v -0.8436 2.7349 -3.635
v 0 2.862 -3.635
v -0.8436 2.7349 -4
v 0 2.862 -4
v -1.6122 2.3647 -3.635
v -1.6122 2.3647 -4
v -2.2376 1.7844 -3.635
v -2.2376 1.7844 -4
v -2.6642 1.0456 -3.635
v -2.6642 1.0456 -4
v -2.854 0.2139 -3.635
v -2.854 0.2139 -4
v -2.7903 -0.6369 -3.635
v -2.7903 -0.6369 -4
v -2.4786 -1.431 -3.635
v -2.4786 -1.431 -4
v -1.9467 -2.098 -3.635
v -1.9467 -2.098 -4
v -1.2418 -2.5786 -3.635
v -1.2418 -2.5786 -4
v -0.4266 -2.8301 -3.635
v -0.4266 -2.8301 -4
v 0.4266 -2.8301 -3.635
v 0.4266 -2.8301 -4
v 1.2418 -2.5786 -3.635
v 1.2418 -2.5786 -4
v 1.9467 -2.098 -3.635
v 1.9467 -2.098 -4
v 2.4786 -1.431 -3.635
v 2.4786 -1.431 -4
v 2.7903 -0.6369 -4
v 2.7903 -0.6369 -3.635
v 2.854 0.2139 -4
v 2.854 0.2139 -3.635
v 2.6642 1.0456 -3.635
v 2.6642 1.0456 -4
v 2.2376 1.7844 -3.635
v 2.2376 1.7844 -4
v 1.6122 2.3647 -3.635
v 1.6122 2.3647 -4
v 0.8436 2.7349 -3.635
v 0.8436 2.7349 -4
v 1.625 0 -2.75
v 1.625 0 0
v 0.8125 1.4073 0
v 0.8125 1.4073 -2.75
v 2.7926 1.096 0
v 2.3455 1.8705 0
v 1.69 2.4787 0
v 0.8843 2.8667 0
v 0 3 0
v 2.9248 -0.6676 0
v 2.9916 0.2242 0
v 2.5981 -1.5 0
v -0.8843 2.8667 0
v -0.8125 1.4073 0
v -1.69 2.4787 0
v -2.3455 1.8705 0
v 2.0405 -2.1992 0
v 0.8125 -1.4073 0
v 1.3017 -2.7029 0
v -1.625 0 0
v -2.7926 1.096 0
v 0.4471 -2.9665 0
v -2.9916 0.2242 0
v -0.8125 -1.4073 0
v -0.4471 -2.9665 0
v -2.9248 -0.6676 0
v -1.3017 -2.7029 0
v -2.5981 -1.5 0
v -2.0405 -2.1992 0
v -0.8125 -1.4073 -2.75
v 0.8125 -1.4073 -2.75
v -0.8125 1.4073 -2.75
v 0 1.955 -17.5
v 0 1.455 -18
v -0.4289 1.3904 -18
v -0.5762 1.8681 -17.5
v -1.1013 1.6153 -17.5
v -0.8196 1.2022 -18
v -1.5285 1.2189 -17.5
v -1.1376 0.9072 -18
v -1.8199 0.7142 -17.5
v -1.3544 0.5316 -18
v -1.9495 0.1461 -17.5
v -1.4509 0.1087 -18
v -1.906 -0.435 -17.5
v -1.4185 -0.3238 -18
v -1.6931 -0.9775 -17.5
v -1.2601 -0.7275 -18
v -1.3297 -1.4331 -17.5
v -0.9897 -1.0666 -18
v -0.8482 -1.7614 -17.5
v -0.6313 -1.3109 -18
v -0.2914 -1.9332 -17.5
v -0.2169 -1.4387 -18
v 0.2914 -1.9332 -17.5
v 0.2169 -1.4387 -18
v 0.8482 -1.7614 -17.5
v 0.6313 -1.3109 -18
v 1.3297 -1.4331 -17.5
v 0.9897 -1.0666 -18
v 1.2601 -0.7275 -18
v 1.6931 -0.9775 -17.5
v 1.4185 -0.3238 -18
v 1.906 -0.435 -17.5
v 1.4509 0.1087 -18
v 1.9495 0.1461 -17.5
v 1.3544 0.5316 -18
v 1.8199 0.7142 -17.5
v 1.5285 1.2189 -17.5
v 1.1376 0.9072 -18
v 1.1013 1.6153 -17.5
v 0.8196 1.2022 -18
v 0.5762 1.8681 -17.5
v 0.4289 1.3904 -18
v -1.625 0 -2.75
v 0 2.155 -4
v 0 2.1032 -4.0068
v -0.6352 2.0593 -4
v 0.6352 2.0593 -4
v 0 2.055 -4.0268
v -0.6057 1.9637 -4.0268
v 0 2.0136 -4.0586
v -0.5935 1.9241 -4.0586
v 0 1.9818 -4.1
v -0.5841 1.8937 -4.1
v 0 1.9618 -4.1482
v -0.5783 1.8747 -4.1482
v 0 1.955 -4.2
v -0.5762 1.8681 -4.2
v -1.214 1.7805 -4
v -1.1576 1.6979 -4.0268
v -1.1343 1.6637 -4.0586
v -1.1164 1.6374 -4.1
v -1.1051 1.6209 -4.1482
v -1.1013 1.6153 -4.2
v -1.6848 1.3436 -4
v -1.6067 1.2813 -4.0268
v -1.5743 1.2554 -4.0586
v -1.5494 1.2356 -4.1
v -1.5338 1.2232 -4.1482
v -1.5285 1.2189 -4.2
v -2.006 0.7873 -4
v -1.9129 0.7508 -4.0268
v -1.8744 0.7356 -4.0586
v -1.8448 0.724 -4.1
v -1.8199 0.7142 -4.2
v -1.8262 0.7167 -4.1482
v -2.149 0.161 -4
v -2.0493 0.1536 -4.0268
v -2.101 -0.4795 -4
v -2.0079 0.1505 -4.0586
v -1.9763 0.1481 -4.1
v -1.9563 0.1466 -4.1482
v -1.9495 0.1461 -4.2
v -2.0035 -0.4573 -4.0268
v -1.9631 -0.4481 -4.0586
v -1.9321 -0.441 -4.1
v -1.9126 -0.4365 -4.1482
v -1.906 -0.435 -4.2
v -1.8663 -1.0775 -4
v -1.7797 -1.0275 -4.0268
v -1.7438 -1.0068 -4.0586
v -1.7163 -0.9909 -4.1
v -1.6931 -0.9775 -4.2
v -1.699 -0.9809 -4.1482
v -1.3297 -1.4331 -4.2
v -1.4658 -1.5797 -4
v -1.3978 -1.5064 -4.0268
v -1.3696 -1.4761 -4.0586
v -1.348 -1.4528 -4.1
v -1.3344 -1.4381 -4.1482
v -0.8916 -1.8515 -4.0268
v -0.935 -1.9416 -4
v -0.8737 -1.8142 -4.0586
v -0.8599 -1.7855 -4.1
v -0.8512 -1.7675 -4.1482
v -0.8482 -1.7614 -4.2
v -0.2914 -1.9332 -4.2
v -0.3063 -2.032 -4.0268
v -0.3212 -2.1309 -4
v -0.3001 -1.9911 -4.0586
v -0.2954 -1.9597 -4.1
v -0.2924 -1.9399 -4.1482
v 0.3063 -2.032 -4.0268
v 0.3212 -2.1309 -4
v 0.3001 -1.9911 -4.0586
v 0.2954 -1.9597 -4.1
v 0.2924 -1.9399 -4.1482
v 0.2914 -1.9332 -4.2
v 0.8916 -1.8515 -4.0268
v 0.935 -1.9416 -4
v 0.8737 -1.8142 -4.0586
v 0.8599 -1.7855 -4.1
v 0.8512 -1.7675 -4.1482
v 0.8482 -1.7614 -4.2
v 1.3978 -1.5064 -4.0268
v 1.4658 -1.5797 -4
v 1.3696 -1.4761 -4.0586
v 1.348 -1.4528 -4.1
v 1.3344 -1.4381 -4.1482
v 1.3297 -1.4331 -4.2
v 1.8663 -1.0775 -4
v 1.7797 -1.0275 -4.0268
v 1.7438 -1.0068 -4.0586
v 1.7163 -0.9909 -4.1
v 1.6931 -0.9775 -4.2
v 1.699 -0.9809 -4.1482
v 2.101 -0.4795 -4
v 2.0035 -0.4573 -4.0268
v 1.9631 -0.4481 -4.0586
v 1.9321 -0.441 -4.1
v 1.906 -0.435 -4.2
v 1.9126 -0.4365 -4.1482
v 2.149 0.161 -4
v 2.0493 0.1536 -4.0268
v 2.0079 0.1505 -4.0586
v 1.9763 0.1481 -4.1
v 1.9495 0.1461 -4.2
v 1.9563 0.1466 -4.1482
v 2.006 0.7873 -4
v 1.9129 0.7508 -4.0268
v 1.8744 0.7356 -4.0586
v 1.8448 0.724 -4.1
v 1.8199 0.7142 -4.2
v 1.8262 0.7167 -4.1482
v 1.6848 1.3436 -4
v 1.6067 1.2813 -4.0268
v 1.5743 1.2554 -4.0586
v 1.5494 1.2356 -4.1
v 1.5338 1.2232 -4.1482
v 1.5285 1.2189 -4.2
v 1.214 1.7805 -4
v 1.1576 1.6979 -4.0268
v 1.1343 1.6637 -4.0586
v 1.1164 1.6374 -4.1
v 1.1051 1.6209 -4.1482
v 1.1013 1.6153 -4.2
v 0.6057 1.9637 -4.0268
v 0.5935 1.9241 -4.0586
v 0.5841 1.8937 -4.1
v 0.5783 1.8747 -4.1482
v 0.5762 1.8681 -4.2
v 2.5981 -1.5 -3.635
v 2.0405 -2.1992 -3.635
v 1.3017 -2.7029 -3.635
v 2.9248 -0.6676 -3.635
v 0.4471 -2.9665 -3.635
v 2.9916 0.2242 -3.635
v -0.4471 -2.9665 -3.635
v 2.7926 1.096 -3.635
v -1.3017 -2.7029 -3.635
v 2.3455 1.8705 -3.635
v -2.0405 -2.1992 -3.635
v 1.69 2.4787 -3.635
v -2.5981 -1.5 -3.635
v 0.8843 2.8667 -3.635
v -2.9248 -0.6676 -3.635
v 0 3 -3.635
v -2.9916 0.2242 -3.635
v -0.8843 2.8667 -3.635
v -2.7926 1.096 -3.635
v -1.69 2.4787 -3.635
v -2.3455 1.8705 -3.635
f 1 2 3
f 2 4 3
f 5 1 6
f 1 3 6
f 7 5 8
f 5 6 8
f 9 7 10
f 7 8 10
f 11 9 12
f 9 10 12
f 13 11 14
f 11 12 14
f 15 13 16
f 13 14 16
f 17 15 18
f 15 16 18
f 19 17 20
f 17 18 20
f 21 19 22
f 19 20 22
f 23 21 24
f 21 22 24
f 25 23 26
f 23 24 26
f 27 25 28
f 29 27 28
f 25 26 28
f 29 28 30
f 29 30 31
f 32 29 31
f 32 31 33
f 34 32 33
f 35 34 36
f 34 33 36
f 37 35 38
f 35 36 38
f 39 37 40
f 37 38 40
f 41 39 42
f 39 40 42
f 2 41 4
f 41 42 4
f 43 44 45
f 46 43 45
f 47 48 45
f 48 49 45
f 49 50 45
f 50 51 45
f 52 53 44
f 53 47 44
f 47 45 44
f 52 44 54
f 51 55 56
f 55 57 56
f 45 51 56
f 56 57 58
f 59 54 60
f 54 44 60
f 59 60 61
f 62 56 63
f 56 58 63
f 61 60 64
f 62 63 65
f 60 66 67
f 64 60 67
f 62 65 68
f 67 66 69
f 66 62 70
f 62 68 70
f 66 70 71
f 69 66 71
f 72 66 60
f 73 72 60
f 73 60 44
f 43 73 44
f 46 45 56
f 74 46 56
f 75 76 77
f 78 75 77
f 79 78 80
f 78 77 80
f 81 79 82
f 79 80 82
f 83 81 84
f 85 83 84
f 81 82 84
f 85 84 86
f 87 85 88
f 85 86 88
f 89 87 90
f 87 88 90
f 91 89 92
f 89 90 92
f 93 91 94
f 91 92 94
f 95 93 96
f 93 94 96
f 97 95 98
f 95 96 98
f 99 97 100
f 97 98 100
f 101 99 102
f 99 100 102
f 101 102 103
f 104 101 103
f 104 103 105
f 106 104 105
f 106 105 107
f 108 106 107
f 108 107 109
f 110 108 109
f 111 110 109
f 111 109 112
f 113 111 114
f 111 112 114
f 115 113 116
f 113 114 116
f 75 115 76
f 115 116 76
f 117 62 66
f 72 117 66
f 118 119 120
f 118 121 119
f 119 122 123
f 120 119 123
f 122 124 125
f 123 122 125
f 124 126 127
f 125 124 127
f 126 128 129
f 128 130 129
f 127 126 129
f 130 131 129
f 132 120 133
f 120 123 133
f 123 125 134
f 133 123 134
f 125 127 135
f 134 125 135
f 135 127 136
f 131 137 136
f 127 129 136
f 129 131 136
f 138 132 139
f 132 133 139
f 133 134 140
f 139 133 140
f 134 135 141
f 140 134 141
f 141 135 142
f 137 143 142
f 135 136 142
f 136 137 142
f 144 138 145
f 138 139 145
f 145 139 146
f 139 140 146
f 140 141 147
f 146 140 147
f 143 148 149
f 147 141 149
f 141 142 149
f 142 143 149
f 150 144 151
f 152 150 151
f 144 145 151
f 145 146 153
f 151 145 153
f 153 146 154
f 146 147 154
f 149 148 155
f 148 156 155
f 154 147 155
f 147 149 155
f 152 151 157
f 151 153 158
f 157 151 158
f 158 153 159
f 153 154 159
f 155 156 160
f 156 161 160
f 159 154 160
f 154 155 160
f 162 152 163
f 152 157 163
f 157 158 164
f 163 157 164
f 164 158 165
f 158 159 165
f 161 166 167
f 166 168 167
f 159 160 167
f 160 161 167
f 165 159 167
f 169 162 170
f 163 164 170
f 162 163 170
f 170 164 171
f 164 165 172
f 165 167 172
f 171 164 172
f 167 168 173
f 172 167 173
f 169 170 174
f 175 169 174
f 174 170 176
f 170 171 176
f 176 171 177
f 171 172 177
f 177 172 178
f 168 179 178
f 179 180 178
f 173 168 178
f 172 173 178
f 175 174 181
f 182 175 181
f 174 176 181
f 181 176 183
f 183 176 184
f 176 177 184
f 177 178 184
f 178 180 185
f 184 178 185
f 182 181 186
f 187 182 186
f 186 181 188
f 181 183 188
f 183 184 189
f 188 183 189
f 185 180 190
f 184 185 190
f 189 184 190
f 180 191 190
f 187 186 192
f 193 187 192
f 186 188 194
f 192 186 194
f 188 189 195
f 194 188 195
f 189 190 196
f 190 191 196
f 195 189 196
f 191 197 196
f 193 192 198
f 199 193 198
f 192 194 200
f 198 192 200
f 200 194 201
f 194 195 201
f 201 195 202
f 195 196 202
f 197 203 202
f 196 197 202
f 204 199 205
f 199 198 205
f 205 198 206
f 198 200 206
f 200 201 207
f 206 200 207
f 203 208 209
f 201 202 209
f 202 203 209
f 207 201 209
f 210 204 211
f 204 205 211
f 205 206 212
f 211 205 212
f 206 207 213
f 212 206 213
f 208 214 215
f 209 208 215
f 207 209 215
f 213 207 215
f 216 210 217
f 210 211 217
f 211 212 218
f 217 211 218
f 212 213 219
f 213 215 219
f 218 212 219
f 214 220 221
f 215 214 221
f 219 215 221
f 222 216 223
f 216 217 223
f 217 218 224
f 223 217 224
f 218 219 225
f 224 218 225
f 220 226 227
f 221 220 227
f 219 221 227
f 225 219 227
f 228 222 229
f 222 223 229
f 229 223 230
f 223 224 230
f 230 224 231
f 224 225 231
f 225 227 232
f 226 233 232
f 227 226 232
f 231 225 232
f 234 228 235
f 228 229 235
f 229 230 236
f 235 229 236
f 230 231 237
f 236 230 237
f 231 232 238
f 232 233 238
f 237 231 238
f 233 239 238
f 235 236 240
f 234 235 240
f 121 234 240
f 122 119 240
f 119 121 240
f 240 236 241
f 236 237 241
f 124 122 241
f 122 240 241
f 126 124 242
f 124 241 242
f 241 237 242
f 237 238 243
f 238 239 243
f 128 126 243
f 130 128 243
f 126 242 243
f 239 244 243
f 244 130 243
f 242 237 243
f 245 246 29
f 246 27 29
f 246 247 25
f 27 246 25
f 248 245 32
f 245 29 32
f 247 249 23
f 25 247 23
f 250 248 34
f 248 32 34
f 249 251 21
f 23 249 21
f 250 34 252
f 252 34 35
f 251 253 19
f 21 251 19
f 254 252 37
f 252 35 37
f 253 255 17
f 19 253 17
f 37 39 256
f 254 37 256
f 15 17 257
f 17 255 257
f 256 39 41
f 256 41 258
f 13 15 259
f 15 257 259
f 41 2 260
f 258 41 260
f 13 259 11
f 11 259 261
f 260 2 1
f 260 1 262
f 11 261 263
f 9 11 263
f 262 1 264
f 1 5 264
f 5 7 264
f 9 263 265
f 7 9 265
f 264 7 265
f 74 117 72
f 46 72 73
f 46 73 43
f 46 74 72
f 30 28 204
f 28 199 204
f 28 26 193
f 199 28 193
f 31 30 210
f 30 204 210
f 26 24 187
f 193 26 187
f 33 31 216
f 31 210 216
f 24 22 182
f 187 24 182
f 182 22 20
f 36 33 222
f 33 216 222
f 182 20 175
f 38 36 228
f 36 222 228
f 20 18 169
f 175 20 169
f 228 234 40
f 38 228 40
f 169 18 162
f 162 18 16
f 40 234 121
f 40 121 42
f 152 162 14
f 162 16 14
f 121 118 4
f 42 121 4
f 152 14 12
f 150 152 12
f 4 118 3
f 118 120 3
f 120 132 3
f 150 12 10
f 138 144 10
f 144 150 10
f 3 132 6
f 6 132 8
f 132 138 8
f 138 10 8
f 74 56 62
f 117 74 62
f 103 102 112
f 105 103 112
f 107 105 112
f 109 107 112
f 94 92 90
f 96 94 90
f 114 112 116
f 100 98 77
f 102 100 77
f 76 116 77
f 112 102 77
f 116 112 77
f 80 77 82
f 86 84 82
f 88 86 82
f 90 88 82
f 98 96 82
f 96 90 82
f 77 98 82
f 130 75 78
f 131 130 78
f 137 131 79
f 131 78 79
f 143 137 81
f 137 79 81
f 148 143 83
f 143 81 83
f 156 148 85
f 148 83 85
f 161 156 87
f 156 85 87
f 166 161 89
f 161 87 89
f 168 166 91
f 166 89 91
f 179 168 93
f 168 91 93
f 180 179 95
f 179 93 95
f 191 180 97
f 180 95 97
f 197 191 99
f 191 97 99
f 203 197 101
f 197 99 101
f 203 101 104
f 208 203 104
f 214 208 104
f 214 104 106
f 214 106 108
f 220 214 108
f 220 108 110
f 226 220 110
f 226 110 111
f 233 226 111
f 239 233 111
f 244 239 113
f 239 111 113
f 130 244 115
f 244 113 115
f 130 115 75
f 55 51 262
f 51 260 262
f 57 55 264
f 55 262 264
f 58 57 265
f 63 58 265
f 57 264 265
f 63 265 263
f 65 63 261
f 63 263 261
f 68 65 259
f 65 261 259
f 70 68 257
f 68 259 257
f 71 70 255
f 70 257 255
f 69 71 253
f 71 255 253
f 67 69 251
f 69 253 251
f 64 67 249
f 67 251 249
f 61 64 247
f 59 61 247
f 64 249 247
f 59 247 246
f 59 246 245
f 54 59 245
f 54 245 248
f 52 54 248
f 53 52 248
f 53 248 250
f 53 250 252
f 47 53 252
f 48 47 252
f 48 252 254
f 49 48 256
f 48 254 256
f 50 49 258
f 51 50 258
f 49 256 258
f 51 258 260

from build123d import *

# Parameters (mm, degrees)
REDONDEO1_R           = 0.2
CHAFL_N1_SIZE         = 0.5
CORTAR_EXTRUIR1_DEPTH = 2.75


with BuildPart() as part:
    # Croquis1 → Revolución1 (revolve)
    with BuildSketch(Plane(origin=(0, 0, 0), x_dir=(0, 0, -1), z_dir=(1, 0, 0))):
        Polygon((0, 3), (3.63504566, 3), (3.63504566, 2.862019845), (4, 2.862019845), (4, 1.955), (18, 1.955), (18, 0), (0, 0), align=None)
    revolve(axis=Axis((0, 0, -18), (0, 0, 1)))

    # Redondeo1
    redondeo1_edges = [part.edges().sort_by_distance(p)[0] for p in [
        (0, -1.955, -4),
    ]]
    fillet(redondeo1_edges, radius=REDONDEO1_R)

    # Chaflán1
    chafl_n1_edges = [part.edges().sort_by_distance(p)[0] for p in [
        (0, -1.955, -18),
    ]]
    chamfer(chafl_n1_edges, length=CHAFL_N1_SIZE)

    # Croquis2 → Cortar-Extruir1 (cut)
    with BuildSketch(Plane.XY):
        Polygon((-1.625, 0), (-0.8125, -1.407291281), (0.8125, -1.407291281), (1.625, 0), (0.8125, 1.407291281), (-0.8125, 1.407291281), align=None)
    extrude(amount=-CORTAR_EXTRUIR1_DEPTH, mode=Mode.SUBTRACT)


solid = part.part
